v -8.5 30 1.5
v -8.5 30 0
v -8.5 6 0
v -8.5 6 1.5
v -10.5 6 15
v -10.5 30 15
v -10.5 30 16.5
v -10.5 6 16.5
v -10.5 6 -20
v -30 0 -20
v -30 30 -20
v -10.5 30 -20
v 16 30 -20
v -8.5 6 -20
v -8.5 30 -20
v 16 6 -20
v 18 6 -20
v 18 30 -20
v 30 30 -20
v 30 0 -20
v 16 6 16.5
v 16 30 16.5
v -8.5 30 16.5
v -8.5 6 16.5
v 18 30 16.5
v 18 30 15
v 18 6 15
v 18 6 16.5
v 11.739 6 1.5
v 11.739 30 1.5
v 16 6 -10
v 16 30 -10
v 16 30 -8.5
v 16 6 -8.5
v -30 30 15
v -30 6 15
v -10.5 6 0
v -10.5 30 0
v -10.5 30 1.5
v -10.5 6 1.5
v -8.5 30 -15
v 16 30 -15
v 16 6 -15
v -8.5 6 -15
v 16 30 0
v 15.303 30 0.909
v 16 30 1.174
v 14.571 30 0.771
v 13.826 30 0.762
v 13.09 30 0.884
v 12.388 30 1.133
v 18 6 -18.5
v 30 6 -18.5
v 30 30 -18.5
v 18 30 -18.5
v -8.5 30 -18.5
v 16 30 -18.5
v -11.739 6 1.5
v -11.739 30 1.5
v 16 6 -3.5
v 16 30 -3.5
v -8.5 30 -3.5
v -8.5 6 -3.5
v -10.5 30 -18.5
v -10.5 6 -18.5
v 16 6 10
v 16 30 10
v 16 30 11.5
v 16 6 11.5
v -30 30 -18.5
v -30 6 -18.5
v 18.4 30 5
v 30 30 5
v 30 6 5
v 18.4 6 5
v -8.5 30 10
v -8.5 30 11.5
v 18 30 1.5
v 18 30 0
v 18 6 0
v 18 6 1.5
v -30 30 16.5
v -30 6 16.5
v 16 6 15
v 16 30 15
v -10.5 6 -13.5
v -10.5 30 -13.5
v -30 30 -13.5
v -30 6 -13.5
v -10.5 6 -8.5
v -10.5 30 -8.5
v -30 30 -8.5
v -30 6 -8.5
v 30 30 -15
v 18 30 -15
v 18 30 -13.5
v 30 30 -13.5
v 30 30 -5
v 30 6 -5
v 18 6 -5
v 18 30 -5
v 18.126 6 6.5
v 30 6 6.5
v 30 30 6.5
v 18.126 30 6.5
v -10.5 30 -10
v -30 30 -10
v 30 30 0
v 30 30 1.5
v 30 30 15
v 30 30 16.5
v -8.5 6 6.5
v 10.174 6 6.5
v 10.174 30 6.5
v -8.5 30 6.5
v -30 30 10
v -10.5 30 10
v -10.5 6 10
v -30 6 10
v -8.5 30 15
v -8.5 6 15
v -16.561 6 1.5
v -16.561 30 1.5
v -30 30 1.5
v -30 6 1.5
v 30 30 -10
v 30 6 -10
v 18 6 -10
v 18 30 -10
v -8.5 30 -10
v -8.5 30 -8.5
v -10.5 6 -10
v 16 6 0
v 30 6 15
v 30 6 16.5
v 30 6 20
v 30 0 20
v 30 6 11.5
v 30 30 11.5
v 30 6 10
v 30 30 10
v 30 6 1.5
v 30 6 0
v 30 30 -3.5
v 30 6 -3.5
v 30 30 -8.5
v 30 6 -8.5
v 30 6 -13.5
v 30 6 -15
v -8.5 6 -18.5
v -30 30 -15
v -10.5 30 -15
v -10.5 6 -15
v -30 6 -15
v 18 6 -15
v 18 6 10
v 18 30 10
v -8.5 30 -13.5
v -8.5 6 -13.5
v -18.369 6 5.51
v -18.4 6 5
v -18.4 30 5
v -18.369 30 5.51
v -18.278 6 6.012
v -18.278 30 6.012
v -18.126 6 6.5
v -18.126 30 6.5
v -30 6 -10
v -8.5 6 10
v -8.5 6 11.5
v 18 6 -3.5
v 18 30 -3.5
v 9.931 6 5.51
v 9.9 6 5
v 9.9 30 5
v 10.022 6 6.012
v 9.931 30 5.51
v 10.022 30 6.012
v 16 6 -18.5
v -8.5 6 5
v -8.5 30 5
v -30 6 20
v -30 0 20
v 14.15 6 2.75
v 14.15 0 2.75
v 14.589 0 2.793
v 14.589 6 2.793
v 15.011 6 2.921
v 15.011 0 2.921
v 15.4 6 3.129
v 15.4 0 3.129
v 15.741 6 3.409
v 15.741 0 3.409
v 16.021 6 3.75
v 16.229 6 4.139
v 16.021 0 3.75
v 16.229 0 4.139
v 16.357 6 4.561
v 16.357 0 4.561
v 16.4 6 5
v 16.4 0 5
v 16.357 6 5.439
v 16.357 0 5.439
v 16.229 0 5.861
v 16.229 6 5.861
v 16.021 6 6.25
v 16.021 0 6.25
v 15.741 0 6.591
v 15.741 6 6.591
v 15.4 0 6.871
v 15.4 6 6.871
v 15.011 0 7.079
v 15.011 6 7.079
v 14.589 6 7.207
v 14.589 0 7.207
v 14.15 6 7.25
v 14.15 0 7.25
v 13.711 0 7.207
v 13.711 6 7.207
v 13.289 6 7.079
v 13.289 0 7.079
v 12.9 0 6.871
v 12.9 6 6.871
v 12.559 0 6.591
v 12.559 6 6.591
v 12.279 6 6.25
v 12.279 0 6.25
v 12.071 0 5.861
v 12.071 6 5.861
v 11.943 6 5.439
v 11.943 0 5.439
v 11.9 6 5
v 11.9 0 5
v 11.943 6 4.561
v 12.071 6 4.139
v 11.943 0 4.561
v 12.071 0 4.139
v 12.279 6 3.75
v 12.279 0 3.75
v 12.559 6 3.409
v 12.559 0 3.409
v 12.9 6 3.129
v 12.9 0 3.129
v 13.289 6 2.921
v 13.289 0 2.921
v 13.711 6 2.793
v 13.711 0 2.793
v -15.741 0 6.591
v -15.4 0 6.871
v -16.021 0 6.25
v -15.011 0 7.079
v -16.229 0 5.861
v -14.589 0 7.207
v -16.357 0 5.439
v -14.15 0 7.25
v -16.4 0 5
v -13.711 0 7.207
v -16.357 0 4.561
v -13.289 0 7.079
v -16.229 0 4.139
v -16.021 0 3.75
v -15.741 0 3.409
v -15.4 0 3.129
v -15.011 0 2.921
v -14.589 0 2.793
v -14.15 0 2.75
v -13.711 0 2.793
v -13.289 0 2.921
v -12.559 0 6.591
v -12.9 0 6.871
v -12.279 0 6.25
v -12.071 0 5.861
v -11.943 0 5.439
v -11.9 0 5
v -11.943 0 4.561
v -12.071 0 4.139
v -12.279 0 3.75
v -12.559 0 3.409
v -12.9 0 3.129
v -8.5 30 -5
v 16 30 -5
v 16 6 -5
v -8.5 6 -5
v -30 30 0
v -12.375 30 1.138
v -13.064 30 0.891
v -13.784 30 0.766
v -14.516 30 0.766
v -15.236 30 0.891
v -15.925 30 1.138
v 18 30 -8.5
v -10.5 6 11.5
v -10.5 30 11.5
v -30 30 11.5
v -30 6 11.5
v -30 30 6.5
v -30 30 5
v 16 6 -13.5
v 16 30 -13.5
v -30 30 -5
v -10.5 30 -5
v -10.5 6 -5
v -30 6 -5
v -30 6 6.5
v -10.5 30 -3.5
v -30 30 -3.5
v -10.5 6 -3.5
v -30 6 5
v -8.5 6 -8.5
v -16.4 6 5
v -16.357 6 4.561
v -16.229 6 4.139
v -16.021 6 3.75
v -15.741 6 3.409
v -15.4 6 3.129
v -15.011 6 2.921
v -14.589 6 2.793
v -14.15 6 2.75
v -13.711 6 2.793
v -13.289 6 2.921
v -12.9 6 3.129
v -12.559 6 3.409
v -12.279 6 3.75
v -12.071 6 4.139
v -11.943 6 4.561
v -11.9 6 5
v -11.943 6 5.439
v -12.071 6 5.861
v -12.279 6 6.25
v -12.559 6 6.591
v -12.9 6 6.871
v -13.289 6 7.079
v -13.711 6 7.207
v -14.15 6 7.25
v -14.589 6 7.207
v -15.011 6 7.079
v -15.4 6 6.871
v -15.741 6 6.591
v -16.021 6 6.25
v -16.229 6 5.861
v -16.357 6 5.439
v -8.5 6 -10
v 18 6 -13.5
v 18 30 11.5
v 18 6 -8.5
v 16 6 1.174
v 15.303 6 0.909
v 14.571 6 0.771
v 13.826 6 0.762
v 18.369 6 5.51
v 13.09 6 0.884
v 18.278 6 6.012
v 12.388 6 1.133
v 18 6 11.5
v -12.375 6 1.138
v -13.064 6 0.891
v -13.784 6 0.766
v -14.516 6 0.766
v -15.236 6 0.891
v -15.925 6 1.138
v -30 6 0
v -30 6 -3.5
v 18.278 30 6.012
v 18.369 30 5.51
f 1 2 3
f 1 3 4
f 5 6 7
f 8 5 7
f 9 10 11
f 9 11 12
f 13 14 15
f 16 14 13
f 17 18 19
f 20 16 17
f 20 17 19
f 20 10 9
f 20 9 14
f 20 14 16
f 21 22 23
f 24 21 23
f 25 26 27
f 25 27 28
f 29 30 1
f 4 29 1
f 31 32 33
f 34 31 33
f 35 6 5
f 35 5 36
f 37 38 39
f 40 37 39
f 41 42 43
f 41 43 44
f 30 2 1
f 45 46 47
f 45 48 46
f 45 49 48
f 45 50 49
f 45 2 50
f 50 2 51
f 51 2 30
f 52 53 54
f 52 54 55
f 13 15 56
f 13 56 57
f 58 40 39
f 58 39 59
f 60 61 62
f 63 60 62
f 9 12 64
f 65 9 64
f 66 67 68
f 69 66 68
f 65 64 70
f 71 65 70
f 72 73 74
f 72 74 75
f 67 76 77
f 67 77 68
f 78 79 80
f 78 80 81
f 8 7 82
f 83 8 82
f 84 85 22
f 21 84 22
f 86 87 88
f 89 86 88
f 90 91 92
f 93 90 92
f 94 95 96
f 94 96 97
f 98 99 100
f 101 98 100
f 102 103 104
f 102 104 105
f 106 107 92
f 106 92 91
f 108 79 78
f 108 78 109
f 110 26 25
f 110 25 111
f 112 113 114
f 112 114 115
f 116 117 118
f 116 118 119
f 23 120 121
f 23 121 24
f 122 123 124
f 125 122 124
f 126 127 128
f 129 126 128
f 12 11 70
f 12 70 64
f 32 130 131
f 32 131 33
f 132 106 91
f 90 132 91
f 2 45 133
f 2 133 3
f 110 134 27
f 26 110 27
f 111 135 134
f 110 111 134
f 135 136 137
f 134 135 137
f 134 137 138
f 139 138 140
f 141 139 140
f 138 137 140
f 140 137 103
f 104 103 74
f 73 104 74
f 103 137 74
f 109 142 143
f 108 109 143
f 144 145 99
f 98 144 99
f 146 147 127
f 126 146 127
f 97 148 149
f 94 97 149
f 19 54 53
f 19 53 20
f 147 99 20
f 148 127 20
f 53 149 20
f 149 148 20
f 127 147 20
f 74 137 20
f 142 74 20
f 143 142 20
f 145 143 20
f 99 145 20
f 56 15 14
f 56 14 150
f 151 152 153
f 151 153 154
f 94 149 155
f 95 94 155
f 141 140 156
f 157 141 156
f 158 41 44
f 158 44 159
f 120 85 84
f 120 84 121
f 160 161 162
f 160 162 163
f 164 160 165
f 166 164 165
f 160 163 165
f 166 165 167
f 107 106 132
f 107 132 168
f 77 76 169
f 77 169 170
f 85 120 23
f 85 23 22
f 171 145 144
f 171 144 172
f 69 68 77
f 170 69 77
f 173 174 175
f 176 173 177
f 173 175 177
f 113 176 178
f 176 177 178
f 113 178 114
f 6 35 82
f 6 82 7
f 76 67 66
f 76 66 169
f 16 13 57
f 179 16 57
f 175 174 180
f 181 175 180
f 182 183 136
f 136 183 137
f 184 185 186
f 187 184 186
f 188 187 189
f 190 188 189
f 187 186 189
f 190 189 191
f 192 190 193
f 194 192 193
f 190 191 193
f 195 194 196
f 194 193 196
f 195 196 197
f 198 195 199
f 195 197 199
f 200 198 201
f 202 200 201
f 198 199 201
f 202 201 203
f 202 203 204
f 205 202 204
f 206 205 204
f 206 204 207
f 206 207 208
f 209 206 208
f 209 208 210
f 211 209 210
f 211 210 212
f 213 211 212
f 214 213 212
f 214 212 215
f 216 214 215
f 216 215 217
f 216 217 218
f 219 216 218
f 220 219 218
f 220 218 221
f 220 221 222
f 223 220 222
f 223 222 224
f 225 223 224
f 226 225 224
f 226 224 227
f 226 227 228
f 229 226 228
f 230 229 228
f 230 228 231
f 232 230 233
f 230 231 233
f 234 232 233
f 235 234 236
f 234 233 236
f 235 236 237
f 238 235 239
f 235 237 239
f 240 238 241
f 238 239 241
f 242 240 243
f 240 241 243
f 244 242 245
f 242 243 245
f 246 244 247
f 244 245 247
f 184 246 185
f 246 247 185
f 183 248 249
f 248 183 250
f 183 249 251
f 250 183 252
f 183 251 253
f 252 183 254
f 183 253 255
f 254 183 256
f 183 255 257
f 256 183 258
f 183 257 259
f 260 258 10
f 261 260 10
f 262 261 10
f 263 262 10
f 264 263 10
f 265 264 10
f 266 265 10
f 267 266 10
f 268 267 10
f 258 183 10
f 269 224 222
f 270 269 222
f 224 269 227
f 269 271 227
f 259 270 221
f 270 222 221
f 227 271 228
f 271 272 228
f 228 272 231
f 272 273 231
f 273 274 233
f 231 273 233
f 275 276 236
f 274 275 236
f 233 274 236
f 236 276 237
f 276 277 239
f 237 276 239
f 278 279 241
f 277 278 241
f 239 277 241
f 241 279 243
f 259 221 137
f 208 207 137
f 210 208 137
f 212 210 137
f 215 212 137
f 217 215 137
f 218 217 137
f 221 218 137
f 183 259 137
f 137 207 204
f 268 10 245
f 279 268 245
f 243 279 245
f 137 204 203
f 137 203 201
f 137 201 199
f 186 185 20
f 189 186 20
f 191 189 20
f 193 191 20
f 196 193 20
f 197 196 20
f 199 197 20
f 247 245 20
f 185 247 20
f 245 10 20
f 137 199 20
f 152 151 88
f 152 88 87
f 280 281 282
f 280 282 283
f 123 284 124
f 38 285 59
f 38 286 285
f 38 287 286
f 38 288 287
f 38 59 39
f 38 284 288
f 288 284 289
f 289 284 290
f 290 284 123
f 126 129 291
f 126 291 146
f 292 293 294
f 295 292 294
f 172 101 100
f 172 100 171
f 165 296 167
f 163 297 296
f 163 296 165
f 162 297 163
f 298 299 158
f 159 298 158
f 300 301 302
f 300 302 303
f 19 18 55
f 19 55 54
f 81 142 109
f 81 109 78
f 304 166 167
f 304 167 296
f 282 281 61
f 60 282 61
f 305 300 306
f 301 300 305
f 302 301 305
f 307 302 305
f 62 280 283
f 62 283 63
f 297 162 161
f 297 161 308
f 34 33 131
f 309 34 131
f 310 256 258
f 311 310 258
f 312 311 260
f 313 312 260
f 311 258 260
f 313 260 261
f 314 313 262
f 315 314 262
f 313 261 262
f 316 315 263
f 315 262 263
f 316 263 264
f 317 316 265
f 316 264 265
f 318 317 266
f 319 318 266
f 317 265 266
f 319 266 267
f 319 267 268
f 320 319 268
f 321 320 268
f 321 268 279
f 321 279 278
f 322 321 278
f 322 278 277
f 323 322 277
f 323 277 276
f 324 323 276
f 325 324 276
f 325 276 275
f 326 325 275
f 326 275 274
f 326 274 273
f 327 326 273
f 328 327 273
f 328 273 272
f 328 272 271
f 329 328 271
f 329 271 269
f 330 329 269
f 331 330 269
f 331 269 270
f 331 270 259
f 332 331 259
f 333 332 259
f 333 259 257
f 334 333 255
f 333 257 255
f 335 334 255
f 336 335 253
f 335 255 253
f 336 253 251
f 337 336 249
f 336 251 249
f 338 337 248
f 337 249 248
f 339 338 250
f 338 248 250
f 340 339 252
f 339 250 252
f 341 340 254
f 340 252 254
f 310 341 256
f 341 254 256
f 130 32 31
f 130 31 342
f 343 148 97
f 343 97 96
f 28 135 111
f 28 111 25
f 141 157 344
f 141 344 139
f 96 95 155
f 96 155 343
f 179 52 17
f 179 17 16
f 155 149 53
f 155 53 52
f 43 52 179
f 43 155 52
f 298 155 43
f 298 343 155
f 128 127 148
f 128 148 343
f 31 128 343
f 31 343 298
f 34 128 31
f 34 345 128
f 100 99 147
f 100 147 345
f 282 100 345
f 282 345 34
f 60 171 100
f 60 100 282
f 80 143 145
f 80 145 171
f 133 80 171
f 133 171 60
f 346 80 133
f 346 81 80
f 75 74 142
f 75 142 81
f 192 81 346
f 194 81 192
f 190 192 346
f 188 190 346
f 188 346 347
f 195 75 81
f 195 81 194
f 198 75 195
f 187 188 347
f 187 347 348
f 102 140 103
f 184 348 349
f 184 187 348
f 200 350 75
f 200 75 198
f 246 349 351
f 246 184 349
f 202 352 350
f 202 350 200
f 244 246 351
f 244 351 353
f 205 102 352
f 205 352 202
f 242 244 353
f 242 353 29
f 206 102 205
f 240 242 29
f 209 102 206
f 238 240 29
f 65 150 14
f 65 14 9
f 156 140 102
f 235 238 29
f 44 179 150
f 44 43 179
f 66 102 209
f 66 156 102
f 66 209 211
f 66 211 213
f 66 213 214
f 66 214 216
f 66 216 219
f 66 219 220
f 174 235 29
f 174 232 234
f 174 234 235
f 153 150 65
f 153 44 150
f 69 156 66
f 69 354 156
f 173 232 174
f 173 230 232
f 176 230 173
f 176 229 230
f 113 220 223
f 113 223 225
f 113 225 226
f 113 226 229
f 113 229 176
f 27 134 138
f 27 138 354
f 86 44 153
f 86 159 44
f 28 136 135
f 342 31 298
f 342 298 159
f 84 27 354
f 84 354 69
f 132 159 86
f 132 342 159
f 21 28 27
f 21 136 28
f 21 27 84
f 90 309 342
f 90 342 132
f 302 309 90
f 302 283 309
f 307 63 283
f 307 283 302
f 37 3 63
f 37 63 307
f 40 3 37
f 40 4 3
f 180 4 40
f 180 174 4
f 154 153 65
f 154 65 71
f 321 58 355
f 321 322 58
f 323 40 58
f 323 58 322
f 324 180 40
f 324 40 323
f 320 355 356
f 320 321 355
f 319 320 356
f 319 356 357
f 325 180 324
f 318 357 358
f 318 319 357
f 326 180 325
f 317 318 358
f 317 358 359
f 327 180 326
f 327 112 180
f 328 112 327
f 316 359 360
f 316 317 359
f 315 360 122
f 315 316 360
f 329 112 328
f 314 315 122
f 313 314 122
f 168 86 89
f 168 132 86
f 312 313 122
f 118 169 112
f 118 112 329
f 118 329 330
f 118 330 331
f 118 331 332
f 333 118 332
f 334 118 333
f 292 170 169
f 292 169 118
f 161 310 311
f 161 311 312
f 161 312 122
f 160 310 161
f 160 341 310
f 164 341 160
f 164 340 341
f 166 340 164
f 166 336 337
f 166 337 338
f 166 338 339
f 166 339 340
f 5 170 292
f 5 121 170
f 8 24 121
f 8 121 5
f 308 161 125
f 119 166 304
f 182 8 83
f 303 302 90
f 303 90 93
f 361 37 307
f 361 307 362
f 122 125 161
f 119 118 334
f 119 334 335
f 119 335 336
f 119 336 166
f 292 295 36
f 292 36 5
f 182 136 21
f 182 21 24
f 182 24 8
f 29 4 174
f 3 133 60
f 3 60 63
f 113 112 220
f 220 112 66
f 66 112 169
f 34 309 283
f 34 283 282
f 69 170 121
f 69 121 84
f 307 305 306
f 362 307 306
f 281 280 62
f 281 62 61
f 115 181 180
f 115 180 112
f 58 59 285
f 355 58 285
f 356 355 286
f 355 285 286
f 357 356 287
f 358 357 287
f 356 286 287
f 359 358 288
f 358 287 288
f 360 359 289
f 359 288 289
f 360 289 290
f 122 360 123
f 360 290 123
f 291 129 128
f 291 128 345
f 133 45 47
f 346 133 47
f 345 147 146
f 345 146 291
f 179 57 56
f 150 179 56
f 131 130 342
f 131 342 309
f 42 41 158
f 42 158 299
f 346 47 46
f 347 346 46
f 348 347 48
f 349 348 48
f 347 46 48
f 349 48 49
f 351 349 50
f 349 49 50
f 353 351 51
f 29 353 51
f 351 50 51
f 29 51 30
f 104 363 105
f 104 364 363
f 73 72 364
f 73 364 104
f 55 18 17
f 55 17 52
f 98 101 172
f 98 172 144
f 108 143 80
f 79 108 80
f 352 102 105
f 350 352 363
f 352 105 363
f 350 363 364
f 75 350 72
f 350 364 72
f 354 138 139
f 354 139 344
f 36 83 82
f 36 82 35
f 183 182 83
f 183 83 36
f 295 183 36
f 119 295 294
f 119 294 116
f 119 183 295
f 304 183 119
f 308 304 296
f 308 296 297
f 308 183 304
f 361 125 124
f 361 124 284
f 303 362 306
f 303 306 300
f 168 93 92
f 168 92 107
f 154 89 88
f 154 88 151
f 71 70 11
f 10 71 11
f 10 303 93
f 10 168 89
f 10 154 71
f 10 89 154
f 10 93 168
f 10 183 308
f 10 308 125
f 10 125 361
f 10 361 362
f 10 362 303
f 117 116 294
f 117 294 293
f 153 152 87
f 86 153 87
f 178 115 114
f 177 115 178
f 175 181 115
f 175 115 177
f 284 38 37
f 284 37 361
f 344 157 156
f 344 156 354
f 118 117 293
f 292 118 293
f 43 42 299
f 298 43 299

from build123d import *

# Parameters (mm, degrees)
SKETCH_1_W          = 60
SKETCH_1_H          = 40
EXTRUDE_1_DEPTH     = 30
SKETCH_2_W          = 60
SKETCH_2_H          = 3.5
CUT_EXTRUDE_1_DEPTH = 24
SKETCH_3_W          = 2
SKETCH_3_H          = 40
CUT_EXTRUDE_2_DEPTH = 24
SKETCH_4_R          = 2.25
CUT_EXTRUDE_3_DEPTH = 47.904157598
SKETCH_5_R          = 4.25
CUT_EXTRUDE_4_DEPTH = 24


with BuildPart() as part:
    # 草图1 → 拉伸1 (new body)
    with BuildSketch(Plane(origin=(0, 0, 0), x_dir=(1, 0, 0), z_dir=(0, 1, 0))):
        Rectangle(SKETCH_1_W, SKETCH_1_H)
    extrude(amount=EXTRUDE_1_DEPTH)

    # 草图2 → 切除-拉伸1 (cut)
    with BuildSketch(Plane(origin=(0, 30, 0), x_dir=(-1, 0, 0), z_dir=(0, 1, 0))):
        with Locations((0, -16.75)):
            Rectangle(SKETCH_2_W, SKETCH_2_H)
        with Locations((0, -11.75)):
            Rectangle(SKETCH_2_W, SKETCH_2_H)
        with Locations((0, -6.75)):
            Rectangle(SKETCH_2_W, SKETCH_2_H)
        with Locations((0, -1.75)):
            Rectangle(SKETCH_2_W, SKETCH_2_H)
        with Locations((0, 3.25)):
            Rectangle(SKETCH_2_W, SKETCH_2_H)
        with Locations((0, 8.25)):
            Rectangle(SKETCH_2_W, SKETCH_2_H)
        with Locations((0, 13.25)):
            Rectangle(SKETCH_2_W, SKETCH_2_H)
        with Locations((0, 18.25)):
            Rectangle(SKETCH_2_W, SKETCH_2_H)
    extrude(amount=-CUT_EXTRUDE_1_DEPTH, mode=Mode.SUBTRACT)

    # 草图3 → 切除-拉伸2 (cut)
    with BuildSketch(Plane(origin=(0, 30, 0), x_dir=(-1, 0, 0), z_dir=(0, 1, 0))):
        with Locations((-17, 0)):
            Rectangle(SKETCH_3_W, SKETCH_3_H)
        with Locations((9.5, 0)):
            Rectangle(SKETCH_3_W, SKETCH_3_H)
    extrude(amount=-CUT_EXTRUDE_2_DEPTH, mode=Mode.SUBTRACT)

    # 草图4 → 切除-拉伸3 (cut, through all)
    with BuildSketch(Plane.XZ):
        with Locations(Location((14.15, 5, 0), (0, 0, 270))):
            Circle(SKETCH_4_R)
        with Locations(Location((-14.15, 5, 0), (0, 0, 180))):
            Circle(SKETCH_4_R)
    extrude(amount=-CUT_EXTRUDE_3_DEPTH, mode=Mode.SUBTRACT)

    # 草图5 → 切除-拉伸4 (cut)
    with BuildSketch(Plane(origin=(0, 30, 0), x_dir=(-1, 0, 0), z_dir=(0, 1, 0))):
        with Locations((14.15, 5)):
            Circle(SKETCH_5_R)
        with Locations((-14.15, 5)):
            Circle(SKETCH_5_R)
    extrude(amount=-CUT_EXTRUDE_4_DEPTH, mode=Mode.SUBTRACT)


solid = part.part
